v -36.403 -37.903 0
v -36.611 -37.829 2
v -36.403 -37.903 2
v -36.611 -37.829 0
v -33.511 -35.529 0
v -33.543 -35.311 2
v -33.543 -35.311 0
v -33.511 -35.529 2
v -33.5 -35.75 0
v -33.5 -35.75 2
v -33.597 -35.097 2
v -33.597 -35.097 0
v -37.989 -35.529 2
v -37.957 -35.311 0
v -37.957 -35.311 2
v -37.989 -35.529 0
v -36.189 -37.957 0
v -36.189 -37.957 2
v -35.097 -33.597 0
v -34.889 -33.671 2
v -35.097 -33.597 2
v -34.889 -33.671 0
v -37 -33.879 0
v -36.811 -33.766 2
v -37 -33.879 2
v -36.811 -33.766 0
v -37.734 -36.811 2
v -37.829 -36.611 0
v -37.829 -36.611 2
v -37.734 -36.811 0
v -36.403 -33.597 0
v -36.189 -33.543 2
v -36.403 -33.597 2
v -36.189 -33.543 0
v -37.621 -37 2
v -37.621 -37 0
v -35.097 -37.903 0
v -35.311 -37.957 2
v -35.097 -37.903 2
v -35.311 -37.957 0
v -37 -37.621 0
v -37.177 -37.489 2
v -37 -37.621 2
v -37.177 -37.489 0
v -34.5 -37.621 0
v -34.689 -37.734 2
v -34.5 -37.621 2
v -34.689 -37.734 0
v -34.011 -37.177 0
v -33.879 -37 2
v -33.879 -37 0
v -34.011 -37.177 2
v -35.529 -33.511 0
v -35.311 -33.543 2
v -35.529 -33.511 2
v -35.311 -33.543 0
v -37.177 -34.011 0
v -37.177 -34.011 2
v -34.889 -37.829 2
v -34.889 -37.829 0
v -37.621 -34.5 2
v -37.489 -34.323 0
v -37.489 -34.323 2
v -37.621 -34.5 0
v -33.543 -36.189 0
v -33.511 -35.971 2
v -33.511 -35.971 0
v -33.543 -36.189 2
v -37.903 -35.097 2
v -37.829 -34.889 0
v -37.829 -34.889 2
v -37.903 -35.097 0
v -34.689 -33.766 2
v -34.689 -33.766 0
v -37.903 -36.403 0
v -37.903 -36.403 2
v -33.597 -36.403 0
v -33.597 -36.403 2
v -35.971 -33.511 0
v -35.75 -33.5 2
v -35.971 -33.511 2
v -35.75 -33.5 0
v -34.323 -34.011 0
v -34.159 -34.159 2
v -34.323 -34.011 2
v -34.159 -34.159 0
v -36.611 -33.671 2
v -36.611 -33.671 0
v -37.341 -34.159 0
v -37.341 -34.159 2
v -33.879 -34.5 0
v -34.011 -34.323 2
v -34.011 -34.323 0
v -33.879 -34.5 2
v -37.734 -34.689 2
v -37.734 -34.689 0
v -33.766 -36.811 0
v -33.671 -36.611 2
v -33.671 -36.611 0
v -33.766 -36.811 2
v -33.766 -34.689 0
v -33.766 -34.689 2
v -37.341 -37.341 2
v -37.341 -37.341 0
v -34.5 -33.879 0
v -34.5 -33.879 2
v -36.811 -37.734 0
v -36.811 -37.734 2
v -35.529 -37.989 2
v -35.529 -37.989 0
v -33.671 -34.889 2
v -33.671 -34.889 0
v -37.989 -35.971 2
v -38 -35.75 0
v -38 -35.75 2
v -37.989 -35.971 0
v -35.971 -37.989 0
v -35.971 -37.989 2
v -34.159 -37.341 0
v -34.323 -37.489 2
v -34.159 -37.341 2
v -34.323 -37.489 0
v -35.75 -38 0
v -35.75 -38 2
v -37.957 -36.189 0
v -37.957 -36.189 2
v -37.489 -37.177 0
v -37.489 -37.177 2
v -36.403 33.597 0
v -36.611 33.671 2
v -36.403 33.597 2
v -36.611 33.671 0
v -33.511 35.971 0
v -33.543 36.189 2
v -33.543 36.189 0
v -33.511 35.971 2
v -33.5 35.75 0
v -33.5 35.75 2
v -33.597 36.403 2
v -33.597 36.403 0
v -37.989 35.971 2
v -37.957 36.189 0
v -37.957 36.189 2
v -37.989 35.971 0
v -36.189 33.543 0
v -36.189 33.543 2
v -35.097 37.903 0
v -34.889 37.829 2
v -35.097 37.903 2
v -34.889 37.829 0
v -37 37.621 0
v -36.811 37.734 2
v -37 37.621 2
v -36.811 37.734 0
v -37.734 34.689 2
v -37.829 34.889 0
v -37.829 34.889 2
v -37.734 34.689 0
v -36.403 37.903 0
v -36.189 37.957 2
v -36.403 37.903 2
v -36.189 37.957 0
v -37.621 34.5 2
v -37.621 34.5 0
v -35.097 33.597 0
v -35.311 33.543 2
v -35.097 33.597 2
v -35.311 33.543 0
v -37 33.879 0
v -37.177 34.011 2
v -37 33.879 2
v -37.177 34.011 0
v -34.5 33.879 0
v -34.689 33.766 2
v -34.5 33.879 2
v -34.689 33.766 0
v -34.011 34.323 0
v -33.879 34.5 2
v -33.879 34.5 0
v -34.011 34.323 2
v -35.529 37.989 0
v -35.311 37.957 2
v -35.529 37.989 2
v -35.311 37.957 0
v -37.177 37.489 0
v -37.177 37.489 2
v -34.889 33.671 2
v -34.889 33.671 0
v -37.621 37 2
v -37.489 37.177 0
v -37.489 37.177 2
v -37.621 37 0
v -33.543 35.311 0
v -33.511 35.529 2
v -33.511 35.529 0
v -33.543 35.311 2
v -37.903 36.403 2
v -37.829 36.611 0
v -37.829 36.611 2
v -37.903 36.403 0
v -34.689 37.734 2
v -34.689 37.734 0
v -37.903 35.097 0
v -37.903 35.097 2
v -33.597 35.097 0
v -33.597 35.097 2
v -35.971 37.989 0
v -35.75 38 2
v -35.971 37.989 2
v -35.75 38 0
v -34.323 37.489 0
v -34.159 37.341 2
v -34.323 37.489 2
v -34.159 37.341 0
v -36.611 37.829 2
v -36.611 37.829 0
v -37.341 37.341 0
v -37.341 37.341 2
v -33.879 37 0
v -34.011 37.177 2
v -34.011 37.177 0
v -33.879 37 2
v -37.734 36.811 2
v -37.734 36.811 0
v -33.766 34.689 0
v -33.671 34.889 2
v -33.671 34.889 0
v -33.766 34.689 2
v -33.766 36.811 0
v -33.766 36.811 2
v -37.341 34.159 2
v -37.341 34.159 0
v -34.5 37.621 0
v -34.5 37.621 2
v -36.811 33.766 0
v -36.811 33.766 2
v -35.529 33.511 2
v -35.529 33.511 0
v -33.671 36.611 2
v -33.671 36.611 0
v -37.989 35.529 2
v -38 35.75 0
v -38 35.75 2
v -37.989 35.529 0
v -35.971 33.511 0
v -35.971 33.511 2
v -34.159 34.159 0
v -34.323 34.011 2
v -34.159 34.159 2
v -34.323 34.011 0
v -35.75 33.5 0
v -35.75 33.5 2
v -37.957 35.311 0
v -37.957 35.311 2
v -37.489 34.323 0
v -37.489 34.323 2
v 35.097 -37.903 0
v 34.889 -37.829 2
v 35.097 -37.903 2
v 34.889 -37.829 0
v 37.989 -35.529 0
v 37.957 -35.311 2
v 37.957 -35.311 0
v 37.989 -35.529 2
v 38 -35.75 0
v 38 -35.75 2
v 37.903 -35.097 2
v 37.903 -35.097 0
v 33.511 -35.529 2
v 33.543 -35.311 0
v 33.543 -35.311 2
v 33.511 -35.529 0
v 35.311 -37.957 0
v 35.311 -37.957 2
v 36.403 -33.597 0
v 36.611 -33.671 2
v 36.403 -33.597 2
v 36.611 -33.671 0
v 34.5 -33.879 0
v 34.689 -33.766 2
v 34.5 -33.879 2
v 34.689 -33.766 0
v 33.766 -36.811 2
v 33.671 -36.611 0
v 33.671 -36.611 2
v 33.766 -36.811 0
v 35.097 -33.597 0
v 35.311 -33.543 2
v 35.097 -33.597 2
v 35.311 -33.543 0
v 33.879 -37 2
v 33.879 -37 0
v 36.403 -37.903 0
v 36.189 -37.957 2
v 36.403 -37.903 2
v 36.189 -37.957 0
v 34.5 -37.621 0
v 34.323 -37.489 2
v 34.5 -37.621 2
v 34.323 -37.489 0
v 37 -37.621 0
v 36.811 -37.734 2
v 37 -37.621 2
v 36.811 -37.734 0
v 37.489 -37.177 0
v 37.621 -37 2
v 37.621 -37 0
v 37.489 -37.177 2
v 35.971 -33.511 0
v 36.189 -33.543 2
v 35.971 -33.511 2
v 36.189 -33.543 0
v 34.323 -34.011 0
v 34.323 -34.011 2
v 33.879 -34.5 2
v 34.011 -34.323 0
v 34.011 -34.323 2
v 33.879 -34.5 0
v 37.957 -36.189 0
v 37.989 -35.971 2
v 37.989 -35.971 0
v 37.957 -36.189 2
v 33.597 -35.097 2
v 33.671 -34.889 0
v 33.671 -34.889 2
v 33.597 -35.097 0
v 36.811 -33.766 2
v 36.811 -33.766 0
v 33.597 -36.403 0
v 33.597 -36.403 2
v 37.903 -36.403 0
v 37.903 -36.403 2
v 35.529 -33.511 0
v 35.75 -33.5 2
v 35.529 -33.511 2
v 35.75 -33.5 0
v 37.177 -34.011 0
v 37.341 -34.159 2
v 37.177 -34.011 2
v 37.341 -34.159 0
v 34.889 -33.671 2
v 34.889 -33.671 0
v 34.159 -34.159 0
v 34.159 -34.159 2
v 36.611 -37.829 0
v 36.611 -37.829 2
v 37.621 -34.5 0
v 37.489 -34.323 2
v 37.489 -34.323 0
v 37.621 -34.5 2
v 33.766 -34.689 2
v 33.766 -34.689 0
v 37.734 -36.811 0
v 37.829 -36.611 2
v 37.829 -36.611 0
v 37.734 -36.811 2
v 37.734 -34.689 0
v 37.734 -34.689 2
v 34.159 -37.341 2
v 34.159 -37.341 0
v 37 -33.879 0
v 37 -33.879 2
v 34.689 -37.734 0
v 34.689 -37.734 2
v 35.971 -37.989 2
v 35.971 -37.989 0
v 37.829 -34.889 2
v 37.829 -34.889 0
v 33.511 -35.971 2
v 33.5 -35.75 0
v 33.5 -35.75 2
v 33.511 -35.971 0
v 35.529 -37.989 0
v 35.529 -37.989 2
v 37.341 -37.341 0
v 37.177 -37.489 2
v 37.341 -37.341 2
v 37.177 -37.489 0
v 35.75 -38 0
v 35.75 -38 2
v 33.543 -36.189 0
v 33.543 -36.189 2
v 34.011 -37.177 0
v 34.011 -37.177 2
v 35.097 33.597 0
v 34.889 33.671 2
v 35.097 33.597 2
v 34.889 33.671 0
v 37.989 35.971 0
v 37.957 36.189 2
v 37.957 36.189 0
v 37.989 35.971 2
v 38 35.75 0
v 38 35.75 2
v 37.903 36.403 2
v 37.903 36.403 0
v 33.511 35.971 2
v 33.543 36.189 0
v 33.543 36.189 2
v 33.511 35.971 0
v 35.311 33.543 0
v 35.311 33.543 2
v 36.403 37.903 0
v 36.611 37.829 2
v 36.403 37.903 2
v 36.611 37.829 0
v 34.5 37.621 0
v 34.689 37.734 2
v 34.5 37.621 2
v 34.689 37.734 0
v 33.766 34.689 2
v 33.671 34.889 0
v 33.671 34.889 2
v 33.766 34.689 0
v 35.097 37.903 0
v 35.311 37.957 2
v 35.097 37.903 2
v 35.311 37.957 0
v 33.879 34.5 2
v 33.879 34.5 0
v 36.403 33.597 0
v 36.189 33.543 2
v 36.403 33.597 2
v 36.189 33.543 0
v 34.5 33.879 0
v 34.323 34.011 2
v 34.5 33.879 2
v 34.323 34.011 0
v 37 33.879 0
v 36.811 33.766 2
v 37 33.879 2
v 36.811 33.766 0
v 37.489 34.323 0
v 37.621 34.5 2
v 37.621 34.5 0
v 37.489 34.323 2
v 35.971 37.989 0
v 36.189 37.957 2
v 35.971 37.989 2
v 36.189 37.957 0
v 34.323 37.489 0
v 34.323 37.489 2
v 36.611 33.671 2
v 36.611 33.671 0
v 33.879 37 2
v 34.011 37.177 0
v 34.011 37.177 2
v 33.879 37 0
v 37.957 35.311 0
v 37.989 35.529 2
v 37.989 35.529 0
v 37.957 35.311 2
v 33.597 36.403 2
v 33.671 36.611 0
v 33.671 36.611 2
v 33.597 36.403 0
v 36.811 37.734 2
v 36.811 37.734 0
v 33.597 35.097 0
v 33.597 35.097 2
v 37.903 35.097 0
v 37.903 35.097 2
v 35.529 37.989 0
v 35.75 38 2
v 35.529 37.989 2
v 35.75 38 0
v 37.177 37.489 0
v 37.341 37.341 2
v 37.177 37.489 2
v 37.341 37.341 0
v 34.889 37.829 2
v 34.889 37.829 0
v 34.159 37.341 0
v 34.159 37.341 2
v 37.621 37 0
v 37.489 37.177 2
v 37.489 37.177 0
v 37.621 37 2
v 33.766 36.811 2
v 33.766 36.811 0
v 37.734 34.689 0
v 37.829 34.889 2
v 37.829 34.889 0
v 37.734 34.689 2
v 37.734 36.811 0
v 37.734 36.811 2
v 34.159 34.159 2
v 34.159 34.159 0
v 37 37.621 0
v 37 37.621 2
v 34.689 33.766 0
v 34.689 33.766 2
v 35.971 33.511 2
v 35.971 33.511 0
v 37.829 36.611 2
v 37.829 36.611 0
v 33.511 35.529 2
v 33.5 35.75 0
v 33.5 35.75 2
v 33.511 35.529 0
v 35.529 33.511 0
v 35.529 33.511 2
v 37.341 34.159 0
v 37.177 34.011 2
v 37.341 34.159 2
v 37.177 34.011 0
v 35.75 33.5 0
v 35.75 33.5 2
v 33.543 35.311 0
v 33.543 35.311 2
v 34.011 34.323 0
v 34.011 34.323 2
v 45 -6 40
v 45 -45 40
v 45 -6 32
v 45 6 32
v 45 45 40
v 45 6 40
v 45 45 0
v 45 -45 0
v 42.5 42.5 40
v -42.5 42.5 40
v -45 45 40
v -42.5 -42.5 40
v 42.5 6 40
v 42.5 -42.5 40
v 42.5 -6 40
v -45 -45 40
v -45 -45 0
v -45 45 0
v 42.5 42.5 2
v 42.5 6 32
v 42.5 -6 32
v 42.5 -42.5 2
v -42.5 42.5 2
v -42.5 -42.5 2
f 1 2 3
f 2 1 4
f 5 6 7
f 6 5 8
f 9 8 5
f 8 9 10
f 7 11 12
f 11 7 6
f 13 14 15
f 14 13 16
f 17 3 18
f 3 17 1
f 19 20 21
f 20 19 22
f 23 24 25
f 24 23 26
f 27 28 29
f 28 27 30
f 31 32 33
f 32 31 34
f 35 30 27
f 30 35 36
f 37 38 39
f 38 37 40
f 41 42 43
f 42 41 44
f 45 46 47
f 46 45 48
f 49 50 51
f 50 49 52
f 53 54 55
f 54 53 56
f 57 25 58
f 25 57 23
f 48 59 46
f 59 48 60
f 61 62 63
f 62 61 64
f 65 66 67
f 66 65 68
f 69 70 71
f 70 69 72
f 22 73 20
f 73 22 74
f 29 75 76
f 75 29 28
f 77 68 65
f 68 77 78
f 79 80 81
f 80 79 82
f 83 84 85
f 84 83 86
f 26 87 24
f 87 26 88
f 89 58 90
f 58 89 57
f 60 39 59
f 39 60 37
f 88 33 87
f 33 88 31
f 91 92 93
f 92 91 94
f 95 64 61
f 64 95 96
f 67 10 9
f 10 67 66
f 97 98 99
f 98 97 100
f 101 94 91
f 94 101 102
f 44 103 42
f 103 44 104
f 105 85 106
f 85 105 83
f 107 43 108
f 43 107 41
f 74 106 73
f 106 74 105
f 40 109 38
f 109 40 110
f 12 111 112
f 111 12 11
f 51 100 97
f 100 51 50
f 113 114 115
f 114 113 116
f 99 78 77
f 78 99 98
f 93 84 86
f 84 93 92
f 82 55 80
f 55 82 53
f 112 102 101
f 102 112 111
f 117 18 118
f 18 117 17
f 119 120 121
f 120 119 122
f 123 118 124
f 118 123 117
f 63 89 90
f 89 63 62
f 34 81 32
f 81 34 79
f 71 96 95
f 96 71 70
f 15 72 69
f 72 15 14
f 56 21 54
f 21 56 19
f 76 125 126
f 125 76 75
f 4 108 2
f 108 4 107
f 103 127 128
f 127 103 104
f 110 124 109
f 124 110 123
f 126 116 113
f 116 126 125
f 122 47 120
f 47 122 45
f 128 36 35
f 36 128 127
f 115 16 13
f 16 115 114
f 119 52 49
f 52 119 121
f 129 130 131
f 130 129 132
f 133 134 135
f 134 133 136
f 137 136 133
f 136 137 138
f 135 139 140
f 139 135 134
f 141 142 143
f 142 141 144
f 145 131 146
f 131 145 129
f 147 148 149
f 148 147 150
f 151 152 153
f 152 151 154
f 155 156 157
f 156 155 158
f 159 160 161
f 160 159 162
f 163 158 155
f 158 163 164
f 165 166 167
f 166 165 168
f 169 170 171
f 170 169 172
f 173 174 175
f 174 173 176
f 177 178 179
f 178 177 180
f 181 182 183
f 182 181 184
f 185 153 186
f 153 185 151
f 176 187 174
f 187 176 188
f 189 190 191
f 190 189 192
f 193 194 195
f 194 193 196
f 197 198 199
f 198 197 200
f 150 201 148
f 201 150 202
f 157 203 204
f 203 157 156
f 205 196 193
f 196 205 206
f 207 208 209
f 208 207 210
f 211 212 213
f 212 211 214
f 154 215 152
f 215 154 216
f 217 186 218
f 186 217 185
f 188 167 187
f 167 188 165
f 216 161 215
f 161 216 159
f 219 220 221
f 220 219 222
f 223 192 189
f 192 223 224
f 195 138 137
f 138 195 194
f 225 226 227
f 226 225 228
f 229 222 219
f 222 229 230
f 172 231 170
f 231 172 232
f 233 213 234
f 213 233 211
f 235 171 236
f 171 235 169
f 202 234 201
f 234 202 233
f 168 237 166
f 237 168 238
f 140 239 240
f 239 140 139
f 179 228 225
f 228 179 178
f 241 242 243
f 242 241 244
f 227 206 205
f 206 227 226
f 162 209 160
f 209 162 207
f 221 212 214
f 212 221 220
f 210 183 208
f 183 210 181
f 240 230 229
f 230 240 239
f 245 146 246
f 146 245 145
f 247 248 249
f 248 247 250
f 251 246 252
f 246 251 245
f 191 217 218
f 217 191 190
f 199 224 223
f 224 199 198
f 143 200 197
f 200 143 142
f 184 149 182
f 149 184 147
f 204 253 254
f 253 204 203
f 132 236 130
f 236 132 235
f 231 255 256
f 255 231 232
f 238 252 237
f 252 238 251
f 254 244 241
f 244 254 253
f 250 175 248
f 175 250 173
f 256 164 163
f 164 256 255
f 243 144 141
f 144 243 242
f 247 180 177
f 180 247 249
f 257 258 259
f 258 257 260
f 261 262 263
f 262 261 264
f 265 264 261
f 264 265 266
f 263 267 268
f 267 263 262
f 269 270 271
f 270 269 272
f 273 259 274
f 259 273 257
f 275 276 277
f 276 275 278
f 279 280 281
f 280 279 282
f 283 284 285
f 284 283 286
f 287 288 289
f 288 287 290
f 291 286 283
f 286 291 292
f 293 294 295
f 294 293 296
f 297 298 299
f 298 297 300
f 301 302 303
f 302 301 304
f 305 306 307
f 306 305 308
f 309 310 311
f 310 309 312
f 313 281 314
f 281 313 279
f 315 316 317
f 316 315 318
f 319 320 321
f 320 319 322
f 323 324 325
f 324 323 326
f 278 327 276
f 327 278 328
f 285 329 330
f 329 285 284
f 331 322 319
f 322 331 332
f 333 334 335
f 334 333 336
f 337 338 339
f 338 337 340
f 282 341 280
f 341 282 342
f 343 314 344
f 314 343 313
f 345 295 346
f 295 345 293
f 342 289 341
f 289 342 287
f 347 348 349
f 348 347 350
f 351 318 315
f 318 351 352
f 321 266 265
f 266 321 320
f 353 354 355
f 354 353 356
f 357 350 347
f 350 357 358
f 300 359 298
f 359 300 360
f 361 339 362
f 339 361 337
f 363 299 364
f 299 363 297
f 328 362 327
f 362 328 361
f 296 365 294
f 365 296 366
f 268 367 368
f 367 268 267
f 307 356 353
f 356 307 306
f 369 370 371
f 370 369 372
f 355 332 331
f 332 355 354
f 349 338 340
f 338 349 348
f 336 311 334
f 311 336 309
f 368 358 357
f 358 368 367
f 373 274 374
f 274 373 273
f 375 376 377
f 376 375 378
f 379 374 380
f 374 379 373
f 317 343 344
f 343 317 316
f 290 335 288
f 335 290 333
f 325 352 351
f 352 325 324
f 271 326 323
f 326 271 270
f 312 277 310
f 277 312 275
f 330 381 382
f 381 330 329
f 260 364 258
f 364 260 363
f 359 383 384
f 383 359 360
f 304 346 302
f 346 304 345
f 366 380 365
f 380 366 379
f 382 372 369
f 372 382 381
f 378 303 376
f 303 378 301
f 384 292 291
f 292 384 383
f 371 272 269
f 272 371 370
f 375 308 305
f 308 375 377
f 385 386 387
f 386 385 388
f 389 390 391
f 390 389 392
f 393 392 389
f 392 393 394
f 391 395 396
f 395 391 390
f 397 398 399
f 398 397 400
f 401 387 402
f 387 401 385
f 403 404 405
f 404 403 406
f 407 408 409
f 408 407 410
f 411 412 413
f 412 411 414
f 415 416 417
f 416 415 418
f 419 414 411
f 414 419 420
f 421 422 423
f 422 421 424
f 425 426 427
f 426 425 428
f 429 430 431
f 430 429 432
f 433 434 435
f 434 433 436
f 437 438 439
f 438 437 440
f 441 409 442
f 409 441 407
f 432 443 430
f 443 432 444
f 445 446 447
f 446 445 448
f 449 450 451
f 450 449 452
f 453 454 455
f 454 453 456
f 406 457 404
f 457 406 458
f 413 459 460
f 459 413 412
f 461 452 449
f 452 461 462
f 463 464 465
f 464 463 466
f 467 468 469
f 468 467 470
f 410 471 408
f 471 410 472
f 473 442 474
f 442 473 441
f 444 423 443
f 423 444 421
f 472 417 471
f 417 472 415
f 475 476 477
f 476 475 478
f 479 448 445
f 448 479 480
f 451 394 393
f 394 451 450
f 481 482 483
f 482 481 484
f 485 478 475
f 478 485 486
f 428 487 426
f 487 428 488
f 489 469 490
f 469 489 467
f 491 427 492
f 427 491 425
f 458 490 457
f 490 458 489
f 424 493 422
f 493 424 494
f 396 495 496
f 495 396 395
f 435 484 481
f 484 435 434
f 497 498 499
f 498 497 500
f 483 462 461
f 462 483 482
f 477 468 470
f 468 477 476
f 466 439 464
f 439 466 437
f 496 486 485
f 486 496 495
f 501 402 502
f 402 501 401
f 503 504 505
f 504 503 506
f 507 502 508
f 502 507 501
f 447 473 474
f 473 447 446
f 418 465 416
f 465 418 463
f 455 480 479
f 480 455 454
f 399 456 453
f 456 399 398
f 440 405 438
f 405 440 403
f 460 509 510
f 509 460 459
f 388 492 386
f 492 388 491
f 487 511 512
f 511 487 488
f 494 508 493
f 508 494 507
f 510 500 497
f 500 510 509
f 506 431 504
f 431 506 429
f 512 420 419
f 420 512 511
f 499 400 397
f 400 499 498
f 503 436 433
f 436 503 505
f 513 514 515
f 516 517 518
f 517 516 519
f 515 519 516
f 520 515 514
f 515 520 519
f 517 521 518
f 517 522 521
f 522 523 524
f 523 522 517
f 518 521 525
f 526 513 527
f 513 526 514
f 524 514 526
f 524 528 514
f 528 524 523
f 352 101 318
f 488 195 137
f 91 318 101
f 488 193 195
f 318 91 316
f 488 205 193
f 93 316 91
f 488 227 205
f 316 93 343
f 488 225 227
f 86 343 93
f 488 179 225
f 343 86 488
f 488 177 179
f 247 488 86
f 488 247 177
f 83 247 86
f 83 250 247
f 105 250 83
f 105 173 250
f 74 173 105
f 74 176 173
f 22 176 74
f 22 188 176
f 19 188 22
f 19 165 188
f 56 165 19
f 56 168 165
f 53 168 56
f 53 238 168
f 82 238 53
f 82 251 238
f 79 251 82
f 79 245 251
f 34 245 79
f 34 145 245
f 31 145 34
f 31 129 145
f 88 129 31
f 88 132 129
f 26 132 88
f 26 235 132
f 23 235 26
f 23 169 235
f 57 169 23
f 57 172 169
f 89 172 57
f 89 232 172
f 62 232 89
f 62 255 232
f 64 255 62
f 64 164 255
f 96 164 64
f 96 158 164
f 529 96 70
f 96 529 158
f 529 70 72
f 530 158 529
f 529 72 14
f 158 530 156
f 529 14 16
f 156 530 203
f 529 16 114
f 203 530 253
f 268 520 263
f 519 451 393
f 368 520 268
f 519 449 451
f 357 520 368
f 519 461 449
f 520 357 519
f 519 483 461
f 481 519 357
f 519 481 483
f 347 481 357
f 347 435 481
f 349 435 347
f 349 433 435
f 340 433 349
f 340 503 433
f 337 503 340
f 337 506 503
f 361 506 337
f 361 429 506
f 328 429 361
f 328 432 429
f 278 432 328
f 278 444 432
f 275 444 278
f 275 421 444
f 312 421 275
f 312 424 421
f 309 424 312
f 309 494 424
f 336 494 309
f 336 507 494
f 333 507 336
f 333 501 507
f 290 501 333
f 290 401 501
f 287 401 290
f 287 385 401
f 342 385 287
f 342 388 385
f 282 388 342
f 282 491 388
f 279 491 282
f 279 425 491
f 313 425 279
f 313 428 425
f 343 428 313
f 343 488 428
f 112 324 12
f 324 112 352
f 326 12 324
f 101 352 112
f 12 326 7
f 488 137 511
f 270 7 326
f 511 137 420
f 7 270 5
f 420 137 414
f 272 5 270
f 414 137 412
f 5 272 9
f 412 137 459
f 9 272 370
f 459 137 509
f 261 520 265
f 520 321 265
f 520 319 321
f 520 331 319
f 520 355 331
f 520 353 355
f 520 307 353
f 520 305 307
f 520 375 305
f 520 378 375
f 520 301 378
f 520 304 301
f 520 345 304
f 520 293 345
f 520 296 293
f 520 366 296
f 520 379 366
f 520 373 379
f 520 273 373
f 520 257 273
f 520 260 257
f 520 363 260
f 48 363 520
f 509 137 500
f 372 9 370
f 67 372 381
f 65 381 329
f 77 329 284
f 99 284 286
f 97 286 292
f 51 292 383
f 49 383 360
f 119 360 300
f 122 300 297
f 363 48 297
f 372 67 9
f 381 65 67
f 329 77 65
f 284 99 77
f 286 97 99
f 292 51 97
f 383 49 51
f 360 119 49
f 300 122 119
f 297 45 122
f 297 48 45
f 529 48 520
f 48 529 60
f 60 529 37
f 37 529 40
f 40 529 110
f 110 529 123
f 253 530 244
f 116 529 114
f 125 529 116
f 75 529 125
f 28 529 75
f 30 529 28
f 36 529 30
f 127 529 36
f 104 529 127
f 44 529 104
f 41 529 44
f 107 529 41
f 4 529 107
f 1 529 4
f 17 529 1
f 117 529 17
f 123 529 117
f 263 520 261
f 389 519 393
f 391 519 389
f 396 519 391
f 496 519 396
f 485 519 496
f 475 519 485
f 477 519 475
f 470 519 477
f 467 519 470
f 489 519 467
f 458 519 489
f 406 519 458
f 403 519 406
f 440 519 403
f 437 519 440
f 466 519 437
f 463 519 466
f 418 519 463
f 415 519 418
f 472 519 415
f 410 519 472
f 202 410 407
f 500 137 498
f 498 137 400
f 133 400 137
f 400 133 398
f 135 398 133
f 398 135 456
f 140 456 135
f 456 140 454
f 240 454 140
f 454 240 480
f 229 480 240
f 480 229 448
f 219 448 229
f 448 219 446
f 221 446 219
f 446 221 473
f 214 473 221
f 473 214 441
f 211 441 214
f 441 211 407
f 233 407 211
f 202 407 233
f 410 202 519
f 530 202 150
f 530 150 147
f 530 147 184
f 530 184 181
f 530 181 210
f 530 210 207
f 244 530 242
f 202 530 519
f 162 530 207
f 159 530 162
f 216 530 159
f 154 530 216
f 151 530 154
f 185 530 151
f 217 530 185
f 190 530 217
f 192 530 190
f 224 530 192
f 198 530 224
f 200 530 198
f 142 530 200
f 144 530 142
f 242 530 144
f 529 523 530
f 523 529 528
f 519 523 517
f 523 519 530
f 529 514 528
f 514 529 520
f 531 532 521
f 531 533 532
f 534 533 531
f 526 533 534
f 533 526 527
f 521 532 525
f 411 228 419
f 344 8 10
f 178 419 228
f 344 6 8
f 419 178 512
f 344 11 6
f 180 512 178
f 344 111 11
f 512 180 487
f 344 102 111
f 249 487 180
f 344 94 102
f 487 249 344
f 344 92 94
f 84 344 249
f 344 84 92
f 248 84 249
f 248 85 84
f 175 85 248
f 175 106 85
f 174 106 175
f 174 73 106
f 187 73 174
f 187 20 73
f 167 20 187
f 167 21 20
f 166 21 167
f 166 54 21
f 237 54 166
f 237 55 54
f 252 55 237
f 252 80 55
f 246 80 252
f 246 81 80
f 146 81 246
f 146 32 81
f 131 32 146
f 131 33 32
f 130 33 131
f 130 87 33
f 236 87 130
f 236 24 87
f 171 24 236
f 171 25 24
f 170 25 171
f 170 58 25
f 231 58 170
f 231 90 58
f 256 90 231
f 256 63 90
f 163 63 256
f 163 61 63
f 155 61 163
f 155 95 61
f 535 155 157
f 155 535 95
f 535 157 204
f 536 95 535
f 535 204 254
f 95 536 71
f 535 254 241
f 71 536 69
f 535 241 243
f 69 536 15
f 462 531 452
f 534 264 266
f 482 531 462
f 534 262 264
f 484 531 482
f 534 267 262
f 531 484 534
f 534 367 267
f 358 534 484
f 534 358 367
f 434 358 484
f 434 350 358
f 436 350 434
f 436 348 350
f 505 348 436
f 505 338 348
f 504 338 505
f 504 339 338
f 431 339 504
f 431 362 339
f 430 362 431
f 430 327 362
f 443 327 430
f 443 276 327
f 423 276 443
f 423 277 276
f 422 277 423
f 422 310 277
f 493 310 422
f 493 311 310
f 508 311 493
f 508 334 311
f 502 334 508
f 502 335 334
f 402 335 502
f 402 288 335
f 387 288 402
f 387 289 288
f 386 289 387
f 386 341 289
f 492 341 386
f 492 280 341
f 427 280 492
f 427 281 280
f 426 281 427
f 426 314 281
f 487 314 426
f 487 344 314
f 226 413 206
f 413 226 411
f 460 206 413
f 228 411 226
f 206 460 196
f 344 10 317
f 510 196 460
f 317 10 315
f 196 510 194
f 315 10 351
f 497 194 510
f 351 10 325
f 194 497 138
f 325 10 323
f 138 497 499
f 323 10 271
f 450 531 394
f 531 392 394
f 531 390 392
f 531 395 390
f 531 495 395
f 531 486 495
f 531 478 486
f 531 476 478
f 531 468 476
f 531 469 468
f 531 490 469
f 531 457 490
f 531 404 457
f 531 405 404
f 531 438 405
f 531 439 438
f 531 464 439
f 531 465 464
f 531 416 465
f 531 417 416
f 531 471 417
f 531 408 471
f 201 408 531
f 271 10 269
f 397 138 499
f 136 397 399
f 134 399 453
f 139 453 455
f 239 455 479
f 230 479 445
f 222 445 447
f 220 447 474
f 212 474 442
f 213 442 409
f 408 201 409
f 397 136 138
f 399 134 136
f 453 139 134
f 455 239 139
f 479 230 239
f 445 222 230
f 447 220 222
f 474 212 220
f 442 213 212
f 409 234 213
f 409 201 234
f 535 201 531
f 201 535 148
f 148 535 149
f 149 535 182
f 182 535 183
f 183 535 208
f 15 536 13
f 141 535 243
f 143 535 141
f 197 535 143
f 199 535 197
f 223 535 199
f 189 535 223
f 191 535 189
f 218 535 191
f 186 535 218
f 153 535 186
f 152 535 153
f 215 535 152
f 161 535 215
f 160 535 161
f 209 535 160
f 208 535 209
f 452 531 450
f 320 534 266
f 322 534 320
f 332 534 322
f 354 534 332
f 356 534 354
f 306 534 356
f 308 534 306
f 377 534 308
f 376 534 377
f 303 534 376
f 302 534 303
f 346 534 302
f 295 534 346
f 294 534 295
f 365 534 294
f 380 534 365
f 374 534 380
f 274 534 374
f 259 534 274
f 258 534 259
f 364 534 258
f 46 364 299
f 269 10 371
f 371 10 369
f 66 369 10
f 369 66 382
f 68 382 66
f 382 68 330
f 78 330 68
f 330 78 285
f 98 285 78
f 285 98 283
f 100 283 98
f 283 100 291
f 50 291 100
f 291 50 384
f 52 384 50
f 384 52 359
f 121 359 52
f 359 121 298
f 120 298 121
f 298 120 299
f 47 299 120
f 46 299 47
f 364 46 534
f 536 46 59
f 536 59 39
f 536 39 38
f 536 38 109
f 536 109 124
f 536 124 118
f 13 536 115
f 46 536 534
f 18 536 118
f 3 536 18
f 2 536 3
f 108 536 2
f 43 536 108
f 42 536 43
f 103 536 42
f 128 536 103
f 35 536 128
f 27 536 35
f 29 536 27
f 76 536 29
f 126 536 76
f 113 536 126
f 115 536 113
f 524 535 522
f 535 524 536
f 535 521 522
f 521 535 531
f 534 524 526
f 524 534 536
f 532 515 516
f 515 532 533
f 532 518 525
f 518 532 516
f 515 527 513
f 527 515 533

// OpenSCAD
// Dimensions (in mm)
outer_size = 90;           // Outer width and length (X and Y)
plate_thickness = 2;       // Thickness of the top stirring plate
wall_thickness = 2.5;      // Thickness of the four side walls
total_height = 40;         // Total height of the housing
hole_diameter = 4.5;       // Diameter of the M4 screw holes
hole_pattern_size = 71.5;  // Square pattern size for the screw holes
notch_width = 12;          // Width of the cable notch (along the wall)
notch_height = 8;          // Height of the cable notch (along Z)

// Centering offset to keep the object centered on the origin in X and Y
offset = outer_size / 2;

// The part is modeled in print orientation:
// The top plate (stirring surface) is at z = 0 to z = 2.
// The walls rise from the plate up to z = 40.
// The box is open at the top (z = 40).

translate([-offset, -offset, 0]) {
    difference() {
        // 1. The main solid block
        cube([outer_size, outer_size, total_height]);

        // 2. The hollow interior
        // The interior starts above the top plate (z = plate_thickness)
        // and extends to the top of the box (z = total_height).
        translate([wall_thickness, wall_thickness, plate_thickness]) {
            cube([outer_size - 2 * wall_thickness, outer_size - 2 * wall_thickness, total_height]);
        }

        // 3. The four M4 screw holes
        // Holes are centered on the 90x90 plate in a 71.5x71.5 pattern.
        for (x = [-hole_pattern_size / 2, hole_pattern_size / 2]) {
            for (y = [-hole_pattern_size / 2, hole_pattern_size / 2]) {
                // Translate to the hole position, ensuring it cuts through the plate
                translate([offset + x, offset + y, -1]) {
                    cylinder(d = hole_diameter, h = plate_thickness + 2, $fn = 64);
                }
            }
        }

        // 4. The cable notch
        // Located in one wall (the wall at x = outer_size).
        // Centered along the wall (Y direction) and reaching 8mm down from the top (Z direction).
        // The notch cuts through the entire wall thickness.
        translate([outer_size - wall_thickness - 1, offset - notch_width / 2, total_height - notch_height]) {
            cube([wall_thickness + 2, notch_width, notch_height + 1]);
        }
    }
}
